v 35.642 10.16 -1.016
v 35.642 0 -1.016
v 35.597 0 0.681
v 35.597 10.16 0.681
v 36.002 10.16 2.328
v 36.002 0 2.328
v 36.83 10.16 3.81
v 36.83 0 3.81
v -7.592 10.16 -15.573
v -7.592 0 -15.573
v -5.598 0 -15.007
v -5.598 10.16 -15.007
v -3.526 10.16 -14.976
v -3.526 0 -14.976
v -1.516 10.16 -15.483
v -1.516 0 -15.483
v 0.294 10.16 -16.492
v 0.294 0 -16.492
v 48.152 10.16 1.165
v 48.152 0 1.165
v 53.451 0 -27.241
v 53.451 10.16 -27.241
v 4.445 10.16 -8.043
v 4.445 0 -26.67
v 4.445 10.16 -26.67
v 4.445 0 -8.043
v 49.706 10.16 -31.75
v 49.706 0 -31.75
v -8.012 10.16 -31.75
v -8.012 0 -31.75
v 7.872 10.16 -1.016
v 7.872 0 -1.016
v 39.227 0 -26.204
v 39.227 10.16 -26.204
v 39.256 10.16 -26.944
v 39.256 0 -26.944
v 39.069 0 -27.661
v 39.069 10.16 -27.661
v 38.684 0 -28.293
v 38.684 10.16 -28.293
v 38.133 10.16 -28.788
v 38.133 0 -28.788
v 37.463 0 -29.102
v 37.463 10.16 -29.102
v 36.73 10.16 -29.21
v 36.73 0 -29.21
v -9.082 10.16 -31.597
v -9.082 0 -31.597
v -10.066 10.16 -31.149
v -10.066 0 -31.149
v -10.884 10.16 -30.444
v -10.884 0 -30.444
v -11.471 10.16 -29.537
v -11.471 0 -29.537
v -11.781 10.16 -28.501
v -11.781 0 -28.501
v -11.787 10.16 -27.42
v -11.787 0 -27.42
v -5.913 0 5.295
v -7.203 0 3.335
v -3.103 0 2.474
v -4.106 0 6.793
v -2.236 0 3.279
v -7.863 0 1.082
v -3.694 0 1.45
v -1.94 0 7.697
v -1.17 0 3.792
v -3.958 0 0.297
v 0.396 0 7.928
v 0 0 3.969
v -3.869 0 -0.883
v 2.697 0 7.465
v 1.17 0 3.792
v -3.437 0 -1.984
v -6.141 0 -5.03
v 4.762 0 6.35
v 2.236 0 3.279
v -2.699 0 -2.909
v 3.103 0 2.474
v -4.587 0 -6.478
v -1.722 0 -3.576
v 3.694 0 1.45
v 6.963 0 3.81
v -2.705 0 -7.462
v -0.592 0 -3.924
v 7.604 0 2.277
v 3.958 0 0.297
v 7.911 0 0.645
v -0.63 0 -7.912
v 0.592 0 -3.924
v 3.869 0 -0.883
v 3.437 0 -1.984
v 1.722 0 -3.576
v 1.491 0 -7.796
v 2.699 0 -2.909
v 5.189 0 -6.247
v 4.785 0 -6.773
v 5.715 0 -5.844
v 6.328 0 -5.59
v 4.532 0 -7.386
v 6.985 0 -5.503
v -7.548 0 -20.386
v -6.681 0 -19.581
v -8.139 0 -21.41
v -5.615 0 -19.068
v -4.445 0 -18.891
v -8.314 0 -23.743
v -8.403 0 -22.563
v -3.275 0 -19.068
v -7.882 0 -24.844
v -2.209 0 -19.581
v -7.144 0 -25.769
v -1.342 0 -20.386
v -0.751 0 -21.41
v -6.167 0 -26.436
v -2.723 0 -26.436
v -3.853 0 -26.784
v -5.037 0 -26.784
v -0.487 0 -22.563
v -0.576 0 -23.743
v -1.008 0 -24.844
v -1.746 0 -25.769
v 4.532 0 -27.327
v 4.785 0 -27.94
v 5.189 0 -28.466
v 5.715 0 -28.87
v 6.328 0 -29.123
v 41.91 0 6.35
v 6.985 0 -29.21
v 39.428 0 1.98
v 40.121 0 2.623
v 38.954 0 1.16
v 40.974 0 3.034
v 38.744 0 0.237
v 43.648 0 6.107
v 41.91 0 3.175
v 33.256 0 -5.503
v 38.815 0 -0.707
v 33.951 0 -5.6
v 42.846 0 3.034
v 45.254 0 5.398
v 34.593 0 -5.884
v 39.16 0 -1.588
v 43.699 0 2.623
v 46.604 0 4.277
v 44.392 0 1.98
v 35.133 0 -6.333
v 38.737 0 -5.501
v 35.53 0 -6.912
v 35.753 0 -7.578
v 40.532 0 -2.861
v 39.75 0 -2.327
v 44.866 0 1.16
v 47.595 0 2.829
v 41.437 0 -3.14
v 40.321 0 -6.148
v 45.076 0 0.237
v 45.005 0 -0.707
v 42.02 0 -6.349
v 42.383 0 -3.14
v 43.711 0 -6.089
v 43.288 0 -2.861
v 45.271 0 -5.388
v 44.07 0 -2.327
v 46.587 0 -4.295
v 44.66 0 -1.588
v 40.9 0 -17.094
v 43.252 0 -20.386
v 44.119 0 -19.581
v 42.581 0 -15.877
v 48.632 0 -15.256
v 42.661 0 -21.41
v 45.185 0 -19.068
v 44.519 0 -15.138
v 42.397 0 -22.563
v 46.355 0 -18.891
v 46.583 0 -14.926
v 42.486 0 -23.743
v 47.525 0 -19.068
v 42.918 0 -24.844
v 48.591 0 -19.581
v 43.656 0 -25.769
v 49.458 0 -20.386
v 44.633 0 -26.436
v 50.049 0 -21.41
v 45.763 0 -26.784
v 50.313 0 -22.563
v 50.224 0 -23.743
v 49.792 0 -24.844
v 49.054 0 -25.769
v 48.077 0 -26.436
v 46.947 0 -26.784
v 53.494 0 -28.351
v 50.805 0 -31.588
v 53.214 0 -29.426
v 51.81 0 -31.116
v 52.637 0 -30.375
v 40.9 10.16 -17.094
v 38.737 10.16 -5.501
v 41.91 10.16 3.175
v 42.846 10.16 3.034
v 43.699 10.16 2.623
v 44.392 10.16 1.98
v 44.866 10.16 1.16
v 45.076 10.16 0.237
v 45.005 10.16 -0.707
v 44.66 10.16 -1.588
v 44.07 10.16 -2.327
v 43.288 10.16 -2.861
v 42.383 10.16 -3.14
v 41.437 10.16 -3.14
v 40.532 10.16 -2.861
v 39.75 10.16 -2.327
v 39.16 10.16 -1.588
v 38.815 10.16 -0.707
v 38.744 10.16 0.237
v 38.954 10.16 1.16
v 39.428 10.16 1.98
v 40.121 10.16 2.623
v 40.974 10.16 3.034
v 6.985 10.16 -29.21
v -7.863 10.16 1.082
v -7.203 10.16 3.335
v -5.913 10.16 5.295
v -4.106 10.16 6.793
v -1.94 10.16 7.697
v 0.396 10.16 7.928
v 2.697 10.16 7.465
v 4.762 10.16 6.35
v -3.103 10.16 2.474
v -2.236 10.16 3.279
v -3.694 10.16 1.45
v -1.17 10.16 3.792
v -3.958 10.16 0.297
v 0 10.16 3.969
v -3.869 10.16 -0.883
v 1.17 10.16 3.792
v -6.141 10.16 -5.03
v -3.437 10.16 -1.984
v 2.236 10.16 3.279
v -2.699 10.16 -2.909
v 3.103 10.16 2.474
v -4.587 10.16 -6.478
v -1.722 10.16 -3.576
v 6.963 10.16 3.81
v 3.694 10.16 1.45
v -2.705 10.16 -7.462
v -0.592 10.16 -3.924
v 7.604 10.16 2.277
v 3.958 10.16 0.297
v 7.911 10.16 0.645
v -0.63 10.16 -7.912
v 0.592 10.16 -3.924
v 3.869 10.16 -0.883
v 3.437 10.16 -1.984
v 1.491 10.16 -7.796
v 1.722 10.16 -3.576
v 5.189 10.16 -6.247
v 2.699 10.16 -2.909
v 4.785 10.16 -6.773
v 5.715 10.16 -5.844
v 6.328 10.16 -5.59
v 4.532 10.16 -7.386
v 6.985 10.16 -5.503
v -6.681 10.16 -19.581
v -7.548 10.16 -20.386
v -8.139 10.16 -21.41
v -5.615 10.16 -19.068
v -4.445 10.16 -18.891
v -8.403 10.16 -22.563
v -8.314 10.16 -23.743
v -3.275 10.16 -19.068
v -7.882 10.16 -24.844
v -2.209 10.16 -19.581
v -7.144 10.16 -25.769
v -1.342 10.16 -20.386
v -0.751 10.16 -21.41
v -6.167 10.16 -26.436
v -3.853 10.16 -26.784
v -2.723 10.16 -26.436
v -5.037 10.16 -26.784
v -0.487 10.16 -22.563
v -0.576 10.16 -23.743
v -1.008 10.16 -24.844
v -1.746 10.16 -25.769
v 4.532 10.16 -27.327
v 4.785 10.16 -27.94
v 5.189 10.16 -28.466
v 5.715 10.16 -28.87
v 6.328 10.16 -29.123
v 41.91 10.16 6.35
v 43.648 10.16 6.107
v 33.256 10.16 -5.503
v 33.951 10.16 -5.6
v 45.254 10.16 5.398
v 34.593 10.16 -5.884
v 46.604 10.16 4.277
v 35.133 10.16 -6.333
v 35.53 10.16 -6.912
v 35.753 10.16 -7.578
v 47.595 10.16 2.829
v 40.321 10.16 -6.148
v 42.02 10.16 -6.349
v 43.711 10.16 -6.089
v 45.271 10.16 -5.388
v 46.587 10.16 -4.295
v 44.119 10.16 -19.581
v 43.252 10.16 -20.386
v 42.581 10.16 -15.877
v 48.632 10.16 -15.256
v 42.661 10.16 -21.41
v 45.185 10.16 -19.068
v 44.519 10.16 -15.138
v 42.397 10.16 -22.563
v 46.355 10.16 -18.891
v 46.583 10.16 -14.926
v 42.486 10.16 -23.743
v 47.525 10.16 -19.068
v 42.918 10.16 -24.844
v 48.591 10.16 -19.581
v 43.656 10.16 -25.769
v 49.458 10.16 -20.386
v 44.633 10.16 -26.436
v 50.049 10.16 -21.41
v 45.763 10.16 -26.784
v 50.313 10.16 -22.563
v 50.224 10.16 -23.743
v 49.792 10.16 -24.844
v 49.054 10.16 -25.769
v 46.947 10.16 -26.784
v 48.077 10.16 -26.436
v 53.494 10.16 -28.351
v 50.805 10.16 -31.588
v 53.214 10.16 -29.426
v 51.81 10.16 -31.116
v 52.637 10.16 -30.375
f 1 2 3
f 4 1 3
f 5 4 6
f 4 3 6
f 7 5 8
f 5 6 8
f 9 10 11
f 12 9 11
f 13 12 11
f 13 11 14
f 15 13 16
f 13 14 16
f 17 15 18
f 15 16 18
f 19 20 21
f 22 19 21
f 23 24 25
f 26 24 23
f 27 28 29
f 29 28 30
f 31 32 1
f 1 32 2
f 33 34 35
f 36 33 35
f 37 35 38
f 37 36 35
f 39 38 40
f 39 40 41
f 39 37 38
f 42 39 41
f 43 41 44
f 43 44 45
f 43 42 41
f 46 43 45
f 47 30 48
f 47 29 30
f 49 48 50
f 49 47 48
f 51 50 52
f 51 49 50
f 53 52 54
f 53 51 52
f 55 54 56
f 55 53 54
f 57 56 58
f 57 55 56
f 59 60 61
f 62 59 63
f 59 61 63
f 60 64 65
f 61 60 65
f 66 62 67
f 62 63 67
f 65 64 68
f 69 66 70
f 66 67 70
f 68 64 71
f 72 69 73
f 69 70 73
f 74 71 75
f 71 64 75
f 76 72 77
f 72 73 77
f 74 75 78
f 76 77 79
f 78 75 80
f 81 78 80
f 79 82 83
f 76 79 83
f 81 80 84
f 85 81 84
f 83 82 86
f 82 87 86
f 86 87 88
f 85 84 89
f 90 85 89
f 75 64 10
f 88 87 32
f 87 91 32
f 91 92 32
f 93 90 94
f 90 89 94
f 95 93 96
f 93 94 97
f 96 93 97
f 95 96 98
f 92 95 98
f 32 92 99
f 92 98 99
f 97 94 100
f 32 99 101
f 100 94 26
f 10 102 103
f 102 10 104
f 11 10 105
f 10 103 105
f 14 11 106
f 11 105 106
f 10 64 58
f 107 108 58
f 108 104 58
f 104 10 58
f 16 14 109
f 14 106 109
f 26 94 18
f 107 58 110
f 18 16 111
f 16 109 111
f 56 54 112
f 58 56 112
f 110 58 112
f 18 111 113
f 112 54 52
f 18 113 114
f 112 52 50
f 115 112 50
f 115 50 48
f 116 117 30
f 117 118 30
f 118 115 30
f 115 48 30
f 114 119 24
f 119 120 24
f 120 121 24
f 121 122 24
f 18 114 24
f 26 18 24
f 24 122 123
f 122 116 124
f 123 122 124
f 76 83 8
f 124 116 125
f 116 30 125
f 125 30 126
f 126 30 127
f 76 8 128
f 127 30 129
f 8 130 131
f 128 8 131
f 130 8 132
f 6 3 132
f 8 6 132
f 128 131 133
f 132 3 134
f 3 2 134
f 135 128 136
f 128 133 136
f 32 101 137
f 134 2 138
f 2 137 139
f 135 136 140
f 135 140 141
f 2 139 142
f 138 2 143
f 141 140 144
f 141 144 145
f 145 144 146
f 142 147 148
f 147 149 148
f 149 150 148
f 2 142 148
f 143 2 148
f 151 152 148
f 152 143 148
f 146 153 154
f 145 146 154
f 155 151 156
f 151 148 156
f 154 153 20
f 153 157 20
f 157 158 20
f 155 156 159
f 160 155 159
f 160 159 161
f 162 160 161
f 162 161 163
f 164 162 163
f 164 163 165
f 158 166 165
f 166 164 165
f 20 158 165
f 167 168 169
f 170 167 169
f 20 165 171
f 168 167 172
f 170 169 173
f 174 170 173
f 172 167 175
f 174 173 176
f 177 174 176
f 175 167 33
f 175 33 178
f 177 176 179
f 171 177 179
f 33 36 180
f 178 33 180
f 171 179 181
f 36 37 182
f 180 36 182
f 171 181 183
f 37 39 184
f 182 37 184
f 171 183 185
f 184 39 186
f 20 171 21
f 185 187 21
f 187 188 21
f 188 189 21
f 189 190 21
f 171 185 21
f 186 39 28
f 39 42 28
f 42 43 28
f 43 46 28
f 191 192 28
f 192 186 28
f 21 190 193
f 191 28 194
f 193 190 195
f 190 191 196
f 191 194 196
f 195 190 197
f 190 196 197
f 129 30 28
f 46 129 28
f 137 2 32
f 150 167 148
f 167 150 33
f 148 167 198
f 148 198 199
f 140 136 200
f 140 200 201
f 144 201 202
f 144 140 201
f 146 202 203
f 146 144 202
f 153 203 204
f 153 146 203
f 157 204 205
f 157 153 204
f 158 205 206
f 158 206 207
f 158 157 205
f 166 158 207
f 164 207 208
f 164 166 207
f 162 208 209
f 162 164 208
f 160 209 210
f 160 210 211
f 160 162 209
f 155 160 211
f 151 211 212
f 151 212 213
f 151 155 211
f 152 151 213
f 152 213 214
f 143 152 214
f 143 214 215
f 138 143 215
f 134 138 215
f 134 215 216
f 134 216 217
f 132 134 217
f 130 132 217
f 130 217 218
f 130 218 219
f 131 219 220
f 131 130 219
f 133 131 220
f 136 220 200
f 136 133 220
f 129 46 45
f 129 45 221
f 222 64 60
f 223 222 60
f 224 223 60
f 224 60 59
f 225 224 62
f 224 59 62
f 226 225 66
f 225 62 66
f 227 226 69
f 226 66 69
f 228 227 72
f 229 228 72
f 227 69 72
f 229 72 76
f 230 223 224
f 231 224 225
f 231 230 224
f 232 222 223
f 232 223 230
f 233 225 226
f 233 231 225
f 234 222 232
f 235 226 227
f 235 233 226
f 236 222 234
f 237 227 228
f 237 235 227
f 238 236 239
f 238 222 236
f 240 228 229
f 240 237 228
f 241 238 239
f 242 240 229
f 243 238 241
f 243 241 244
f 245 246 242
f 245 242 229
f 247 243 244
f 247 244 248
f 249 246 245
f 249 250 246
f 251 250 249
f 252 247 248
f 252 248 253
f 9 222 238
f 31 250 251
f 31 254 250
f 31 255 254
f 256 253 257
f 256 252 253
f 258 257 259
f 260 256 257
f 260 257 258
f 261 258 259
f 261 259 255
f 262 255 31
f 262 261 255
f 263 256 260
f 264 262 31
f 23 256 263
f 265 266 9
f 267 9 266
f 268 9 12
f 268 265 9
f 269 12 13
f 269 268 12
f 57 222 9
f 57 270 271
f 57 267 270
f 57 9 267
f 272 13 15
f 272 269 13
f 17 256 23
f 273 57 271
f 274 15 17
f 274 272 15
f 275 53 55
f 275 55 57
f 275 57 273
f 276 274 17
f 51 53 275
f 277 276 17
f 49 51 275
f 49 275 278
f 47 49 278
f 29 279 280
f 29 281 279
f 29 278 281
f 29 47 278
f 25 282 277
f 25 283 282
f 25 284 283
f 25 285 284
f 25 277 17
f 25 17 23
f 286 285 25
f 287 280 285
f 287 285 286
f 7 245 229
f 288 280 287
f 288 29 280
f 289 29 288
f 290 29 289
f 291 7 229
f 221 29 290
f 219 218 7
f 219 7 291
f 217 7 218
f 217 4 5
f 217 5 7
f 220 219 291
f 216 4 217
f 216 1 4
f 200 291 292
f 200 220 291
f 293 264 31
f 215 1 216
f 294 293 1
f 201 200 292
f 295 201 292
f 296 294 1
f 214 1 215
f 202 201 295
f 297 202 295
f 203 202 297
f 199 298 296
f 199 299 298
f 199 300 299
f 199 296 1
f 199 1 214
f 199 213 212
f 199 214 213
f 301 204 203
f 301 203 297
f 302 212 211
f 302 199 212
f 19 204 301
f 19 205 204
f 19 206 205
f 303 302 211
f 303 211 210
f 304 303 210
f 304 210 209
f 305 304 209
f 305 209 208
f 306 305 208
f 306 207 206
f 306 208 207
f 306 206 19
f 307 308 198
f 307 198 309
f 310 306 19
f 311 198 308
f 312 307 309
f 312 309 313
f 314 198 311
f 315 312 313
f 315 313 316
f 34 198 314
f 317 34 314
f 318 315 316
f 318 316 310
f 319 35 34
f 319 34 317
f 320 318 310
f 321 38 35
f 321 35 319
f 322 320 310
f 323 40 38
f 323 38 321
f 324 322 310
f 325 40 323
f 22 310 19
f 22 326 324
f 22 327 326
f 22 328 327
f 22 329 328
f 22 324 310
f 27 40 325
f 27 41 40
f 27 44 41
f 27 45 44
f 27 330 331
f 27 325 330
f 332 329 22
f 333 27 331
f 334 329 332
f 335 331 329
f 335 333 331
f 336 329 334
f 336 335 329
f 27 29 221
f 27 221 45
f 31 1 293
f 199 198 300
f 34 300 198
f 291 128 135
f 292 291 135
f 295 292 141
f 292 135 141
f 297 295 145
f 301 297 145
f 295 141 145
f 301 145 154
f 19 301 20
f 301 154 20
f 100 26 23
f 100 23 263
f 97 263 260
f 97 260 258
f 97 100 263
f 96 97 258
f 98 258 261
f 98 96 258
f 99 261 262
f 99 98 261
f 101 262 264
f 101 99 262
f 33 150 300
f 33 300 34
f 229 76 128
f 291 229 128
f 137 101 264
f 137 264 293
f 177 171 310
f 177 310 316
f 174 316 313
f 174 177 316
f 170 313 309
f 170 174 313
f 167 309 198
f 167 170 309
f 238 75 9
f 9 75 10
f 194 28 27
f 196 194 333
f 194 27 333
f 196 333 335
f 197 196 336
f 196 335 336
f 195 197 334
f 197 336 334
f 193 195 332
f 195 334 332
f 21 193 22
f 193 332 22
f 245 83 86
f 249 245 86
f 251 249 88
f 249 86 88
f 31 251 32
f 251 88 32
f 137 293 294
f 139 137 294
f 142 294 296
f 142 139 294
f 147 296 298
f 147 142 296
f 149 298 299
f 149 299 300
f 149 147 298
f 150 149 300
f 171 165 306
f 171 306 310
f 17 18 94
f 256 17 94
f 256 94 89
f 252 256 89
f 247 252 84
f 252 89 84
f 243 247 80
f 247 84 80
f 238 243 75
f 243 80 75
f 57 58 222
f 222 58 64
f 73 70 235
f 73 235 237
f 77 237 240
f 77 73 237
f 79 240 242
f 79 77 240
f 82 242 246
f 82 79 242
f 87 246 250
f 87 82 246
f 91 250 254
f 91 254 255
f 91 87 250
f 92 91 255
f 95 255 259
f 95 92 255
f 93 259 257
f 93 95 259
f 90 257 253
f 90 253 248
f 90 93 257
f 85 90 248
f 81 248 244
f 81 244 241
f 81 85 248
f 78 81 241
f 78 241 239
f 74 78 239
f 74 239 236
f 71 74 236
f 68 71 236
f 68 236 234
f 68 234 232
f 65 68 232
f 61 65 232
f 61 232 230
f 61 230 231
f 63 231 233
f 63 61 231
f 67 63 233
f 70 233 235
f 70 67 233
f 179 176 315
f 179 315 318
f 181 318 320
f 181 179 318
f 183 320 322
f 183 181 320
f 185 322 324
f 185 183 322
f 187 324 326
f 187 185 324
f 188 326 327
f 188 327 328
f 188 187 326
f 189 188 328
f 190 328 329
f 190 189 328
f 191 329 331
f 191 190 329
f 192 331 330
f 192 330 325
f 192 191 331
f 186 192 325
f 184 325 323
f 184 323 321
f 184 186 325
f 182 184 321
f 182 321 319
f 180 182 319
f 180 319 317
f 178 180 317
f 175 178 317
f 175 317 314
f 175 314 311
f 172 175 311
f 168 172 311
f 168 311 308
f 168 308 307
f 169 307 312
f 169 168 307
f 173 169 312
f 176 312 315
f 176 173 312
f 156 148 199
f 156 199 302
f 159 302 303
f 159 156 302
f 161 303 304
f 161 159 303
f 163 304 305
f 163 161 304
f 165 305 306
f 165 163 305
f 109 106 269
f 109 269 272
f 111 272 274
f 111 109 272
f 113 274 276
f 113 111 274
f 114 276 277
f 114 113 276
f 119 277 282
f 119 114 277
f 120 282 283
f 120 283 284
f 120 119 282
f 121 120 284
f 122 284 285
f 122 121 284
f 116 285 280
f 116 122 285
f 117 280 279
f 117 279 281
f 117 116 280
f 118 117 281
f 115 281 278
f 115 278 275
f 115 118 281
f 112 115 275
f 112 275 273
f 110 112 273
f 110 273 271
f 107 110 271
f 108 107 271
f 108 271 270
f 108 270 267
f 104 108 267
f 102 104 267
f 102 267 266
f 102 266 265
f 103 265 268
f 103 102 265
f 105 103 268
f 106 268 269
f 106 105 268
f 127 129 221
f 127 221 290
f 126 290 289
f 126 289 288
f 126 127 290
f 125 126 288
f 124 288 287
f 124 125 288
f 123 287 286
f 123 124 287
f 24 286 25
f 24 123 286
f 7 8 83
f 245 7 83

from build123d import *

# Parameters (mm, degrees)
SKETCH4_R           = 3.96875
SKETCH4_R_2         = 3.175
BOSS_EXTRUDE2_DEPTH = 10.16
FILLET1_R           = 3.81


with BuildPart() as part:
    # Sketch4 → Boss-Extrude2 (new body)
    with BuildSketch(Plane(origin=(0, 0, 0), x_dir=(1, 0, 0), z_dir=(0, 1, 0))):
        with BuildLine():
            Line((54.2925, 31.75), (-12.3825, 31.75))
            Line((-12.3825, 31.75), (-7.863361559, -1.082336008))
            ThreePointArc((-7.863361559, -1.082336008), (-3.056289676, -7.325503373), (4.7625, -6.35))
            Line((4.7625, -6.35), (41.91, -6.35))
            ThreePointArc((41.91, -6.35), (45.967580476, -4.884520517), (48.152310263, -1.164501002))
            Line((48.152310263, -1.164501002), (54.2925, 31.75))
        make_face()
        with Locations(Location((0, 0, 0), (0, 0, 270))):
            Circle(SKETCH4_R, mode=Mode.SUBTRACT)
        with Locations(Location((46.355, 22.86, 0), (0, 0, 270))):
            Circle(SKETCH4_R, mode=Mode.SUBTRACT)
        with Locations(Location((-4.445, 22.86, 0), (0, 0, 270))):
            Circle(SKETCH4_R, mode=Mode.SUBTRACT)
        with Locations(Location((41.91, 0, 0), (0, 0, 270))):
            Circle(SKETCH4_R_2, mode=Mode.SUBTRACT)
        with BuildLine():
            Line((36.730478204, 29.21), (6.985, 29.21))
            ThreePointArc((6.985, 29.21), (5.188948776, 28.466051224), (4.445, 26.67))
            Line((4.445, 26.67), (4.445, 8.043333333))
            ThreePointArc((4.445, 8.043333333), (5.188948776, 6.247282109), (6.985, 5.503333333))
            Line((6.985, 5.503333333), (33.255679437, 5.503333333))
            ThreePointArc((33.255679437, 5.503333333), (34.878711627, 6.089525126), (35.752603542, 7.577532932))
            Line((35.752603542, 7.577532932), (39.227402309, 26.204199599))
            ThreePointArc((39.227402309, 26.204199599), (38.684286411, 28.29303219), (36.730478204, 29.21))
        make_face(mode=Mode.SUBTRACT)
        with BuildLine():
            Line((46.58698696, 4.295147609), (48.631735848, 15.256028661))
            ThreePointArc((48.631735848, 15.256028661), (44.519378774, 15.137668683), (40.900146495, 17.093850549))
            Line((40.900146495, 17.093850549), (38.737442476, 5.500670755))
            ThreePointArc((38.737442476, 5.500670755), (42.873923491, 6.276412312), (46.58698696, 4.295147609))
        make_face(mode=Mode.SUBTRACT)
        with BuildLine():
            Line((36.83, -3.81), (6.963318623, -3.81))
            ThreePointArc((6.963318623, -3.81), (7.800370345, -1.469057088), (7.872207457, 1.016))
            Line((7.872207457, 1.016), (35.641806959, 1.016))
            ThreePointArc((35.641806959, 1.016), (35.744131016, -1.518077625), (36.83, -3.81))
        make_face(mode=Mode.SUBTRACT)
        with BuildLine():
            Line((-6.14066773, 5.029523445), (-7.591897143, 15.572960504))
            ThreePointArc((-7.591897143, 15.572960504), (-3.525796009, 14.975903966), (0.293891225, 16.492361803))
            Line((0.293891225, 16.492361803), (1.490851578, 7.796234208))
            ThreePointArc((1.490851578, 7.796234208), (-2.705340953, 7.462240721), (-6.14066773, 5.029523445))
        make_face(mode=Mode.SUBTRACT)
    extrude(amount=BOSS_EXTRUDE2_DEPTH)

    # Fillet1
    fillet1_edges = [part.edges().sort_by_distance(p)[0] for p in [
        (-12.3825, 5.08, -31.75),
        (54.2925, 5.08, -31.75),
    ]]
    fillet(fillet1_edges, radius=FILLET1_R)


solid = part.part
